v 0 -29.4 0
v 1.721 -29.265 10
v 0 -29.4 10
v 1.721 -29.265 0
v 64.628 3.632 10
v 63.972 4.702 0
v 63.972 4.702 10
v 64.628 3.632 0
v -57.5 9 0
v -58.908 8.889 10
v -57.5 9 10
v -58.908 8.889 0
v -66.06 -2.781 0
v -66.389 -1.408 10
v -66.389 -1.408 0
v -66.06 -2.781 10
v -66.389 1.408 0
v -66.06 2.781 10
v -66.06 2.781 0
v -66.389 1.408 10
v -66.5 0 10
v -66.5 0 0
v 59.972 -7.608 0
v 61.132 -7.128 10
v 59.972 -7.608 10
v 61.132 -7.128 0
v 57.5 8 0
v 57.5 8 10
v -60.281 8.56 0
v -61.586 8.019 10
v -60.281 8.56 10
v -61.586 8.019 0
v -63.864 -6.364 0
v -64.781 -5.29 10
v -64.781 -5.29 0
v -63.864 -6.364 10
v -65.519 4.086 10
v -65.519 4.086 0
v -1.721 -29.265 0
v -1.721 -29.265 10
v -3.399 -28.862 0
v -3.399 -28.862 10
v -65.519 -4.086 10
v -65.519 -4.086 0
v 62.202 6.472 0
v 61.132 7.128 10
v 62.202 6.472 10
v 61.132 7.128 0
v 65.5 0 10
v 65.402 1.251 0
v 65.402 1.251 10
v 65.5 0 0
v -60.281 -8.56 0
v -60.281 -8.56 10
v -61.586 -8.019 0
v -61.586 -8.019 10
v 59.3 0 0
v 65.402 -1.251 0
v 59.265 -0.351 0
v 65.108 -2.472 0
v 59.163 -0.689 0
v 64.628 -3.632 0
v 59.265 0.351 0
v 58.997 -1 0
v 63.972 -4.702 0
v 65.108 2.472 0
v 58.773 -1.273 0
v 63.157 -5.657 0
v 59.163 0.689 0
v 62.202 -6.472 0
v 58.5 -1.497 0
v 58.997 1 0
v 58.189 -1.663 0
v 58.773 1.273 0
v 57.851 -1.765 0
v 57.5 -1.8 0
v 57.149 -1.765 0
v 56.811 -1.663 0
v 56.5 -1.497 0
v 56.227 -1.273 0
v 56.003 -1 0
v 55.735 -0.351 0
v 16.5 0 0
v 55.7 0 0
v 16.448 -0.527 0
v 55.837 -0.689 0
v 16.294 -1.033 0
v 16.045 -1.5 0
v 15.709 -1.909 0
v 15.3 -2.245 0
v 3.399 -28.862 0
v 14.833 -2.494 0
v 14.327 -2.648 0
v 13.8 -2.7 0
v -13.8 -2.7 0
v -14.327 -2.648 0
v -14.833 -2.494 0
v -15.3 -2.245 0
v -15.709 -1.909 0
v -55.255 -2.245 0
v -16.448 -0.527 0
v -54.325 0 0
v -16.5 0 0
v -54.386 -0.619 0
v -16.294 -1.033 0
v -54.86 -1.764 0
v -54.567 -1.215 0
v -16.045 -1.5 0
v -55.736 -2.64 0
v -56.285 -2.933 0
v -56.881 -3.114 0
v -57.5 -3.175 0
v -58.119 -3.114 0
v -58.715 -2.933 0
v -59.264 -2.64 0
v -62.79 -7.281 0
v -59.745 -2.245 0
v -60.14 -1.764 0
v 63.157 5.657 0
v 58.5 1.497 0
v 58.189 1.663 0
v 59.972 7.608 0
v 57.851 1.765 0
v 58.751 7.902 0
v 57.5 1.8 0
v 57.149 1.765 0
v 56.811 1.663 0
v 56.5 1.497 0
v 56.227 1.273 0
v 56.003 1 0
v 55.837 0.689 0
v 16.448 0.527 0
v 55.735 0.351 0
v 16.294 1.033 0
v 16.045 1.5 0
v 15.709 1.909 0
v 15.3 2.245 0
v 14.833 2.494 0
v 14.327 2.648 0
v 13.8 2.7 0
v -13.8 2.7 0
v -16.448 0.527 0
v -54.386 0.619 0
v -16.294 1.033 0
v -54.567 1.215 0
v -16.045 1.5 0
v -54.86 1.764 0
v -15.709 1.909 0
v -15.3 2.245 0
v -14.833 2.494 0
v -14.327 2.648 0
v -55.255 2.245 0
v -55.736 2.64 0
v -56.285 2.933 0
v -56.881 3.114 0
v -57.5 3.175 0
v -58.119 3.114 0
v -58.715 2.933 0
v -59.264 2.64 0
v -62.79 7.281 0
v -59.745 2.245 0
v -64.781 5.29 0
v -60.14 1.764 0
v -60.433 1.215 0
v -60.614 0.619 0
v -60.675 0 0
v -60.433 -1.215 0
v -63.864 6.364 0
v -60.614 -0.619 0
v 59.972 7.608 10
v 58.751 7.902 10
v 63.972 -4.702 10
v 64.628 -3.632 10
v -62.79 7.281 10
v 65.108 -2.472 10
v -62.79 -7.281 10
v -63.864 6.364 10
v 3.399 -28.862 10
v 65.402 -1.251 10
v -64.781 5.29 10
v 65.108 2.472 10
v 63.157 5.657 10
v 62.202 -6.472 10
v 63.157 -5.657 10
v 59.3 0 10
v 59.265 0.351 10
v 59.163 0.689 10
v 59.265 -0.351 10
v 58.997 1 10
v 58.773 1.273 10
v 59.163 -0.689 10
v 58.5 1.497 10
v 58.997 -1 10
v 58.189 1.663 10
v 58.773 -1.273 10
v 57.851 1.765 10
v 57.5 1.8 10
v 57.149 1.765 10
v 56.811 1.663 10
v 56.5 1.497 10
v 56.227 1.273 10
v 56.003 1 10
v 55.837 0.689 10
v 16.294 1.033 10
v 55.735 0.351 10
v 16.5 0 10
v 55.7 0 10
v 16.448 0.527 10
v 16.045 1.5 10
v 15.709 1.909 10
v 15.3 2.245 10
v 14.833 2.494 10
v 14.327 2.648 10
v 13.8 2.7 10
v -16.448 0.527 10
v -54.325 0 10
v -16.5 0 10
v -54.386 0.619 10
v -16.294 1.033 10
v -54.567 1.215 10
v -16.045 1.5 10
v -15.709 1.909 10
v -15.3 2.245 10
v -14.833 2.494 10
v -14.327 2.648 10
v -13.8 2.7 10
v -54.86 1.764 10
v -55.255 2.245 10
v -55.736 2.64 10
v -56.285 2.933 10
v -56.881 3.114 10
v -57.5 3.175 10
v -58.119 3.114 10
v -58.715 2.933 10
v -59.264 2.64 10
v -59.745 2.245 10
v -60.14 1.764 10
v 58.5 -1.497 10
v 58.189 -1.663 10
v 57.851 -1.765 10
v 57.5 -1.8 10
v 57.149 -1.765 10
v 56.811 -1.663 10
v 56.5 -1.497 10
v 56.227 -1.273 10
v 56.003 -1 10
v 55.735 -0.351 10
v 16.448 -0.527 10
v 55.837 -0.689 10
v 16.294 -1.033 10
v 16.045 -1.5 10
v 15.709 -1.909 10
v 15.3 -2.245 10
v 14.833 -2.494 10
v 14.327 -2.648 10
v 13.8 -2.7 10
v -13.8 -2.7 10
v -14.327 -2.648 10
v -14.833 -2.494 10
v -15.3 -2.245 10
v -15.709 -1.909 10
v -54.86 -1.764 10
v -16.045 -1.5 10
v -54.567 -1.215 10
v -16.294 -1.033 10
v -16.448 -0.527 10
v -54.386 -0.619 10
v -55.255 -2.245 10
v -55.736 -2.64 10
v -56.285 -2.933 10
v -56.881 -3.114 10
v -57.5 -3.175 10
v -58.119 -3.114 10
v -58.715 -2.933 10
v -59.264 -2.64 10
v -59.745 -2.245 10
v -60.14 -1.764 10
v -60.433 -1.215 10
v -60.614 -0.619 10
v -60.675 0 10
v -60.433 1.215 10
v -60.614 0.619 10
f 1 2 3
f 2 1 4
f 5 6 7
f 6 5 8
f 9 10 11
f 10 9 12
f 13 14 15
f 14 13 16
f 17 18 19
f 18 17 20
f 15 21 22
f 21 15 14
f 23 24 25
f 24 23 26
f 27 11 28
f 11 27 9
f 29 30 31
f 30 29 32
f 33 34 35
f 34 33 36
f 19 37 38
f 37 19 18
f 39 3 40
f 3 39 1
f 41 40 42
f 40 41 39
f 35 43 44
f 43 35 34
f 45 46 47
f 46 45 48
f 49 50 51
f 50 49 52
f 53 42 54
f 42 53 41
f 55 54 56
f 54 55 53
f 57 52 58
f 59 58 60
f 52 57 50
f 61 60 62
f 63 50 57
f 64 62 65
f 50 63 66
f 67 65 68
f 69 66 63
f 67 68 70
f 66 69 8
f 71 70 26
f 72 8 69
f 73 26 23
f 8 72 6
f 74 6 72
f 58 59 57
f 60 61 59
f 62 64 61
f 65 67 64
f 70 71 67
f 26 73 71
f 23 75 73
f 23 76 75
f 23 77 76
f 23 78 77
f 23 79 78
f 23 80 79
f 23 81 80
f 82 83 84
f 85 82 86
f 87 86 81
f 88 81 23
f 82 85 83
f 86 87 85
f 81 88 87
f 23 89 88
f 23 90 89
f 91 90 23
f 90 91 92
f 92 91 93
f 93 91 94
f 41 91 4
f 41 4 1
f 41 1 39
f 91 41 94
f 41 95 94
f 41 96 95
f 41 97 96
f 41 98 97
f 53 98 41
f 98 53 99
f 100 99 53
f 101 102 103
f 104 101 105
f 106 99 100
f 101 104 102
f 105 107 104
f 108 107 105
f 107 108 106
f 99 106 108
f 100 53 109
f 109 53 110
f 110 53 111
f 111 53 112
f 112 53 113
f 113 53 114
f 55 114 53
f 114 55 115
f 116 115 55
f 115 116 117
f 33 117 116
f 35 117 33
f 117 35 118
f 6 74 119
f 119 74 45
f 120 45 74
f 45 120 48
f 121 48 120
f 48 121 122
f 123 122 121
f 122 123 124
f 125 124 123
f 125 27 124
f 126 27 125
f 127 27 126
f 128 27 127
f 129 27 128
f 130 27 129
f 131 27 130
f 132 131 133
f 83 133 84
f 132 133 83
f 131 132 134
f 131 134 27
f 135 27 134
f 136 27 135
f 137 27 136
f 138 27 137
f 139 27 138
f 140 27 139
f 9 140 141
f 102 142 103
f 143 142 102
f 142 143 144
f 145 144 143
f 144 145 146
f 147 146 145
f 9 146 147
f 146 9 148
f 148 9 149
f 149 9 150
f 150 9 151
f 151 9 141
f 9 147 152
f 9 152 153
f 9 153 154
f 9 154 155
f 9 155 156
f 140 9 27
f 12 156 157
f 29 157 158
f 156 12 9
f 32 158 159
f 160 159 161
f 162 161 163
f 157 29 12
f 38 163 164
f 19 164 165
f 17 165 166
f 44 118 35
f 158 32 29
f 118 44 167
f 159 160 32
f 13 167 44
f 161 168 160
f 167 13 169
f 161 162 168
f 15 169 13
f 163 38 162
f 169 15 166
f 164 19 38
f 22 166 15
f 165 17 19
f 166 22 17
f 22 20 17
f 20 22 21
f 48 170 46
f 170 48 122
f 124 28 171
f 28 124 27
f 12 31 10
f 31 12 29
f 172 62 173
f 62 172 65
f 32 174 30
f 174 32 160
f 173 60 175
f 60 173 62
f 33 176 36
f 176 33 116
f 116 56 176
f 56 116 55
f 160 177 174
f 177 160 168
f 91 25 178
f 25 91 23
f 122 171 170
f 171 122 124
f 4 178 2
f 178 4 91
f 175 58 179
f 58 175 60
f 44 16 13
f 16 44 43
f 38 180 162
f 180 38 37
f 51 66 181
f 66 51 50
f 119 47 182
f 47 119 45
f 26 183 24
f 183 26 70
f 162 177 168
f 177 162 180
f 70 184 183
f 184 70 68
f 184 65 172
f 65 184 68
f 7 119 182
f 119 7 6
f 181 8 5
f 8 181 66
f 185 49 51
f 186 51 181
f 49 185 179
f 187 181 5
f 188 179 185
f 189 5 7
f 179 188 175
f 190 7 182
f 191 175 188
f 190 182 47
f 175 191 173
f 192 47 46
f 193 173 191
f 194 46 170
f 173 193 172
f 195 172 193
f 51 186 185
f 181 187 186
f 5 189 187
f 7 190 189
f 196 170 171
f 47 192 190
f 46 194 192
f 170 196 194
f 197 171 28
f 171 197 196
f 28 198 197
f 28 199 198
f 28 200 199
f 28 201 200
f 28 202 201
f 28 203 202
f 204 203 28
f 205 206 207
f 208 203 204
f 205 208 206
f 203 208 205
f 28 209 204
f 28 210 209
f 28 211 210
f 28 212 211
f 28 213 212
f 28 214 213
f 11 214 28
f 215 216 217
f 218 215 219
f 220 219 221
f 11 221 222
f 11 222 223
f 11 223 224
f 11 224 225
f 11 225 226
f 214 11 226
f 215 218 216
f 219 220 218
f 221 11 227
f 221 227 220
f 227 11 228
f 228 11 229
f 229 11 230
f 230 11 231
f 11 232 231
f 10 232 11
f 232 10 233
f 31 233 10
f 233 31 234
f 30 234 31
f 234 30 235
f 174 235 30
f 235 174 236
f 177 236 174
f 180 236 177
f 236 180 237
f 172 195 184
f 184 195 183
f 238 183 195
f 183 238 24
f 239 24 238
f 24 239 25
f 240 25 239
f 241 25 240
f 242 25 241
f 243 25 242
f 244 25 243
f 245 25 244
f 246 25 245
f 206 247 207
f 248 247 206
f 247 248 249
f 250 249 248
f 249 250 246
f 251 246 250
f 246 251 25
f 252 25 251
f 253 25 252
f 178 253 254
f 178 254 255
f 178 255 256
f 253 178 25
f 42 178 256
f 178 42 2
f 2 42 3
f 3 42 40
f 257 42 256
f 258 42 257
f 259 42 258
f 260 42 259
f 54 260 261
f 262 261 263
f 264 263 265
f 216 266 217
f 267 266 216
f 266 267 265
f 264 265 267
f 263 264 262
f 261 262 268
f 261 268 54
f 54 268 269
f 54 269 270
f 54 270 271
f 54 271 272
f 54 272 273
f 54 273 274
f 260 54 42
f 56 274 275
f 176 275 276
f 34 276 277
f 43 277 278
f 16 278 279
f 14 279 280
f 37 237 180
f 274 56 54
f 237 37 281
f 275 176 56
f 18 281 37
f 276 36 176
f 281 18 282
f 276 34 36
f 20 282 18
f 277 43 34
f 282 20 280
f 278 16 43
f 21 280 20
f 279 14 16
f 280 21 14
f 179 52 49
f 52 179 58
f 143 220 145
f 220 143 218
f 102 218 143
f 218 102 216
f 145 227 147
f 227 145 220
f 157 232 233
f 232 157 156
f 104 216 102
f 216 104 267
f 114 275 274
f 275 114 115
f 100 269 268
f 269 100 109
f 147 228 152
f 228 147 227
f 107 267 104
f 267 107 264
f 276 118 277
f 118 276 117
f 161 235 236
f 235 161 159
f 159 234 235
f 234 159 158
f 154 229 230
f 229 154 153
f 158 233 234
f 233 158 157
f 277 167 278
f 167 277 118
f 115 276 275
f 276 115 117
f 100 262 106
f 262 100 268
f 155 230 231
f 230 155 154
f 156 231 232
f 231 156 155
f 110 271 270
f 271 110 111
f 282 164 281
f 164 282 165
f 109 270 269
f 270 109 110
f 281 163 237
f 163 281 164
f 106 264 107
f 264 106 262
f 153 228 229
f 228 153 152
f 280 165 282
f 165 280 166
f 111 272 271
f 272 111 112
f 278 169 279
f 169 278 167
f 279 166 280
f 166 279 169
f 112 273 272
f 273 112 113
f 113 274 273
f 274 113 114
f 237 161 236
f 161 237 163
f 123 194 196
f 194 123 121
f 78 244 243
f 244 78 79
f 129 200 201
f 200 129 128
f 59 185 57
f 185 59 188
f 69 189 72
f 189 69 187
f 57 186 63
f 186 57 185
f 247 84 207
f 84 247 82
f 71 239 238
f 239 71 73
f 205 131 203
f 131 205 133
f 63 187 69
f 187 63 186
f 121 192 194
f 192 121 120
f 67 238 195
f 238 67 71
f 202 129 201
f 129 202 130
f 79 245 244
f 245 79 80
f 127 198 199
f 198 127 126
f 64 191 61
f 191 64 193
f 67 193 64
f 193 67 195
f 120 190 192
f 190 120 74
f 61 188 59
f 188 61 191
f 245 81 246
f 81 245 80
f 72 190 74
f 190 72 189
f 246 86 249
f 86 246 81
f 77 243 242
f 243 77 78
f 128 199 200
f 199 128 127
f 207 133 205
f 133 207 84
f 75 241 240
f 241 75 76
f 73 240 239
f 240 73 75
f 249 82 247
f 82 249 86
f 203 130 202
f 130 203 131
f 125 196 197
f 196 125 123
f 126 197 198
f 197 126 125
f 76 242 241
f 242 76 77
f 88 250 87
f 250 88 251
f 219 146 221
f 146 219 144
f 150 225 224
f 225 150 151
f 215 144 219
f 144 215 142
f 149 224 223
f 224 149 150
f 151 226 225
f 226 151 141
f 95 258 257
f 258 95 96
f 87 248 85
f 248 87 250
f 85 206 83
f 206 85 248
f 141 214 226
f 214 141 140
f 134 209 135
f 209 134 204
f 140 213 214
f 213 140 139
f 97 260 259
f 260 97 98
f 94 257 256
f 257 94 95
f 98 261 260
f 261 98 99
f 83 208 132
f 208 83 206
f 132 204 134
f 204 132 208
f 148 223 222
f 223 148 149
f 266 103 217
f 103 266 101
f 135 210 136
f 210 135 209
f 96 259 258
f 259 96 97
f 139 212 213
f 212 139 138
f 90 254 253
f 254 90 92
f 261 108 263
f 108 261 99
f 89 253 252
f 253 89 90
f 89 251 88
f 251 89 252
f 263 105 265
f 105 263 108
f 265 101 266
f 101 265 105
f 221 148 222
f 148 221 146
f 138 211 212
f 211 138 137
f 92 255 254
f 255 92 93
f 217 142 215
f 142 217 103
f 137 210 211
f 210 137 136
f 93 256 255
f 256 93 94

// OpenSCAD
$fn = 32;

// ----------------------------------------------------------------------
// Lever: 115 mm between the bosses, 10 mm thick, smooth outline
// ----------------------------------------------------------------------

// --- parameters (mm) ---
lever_l = 115;            // distance between the boss centres
boss_a = 18;              // first boss diameter
boss_b = 16;              // second boss diameter
bore_a = 6.35;            // first bore
bore_b = 3.6;             // second bore
lever_t = 10;             // lever thickness
boss_c = 22;              // middle boss diameter
bend = 18.4;              // how far the middle boss drops
slot_w = 5.4;             // adjustment slot width

lever_profile = [[-66.5, 0], [-66.389, -1.408], [-66.06, -2.781], [-65.519, -4.086], [-64.781, -5.29], [-63.864, -6.364], [-62.79, -7.281], [-61.586, -8.019], [-60.281, -8.56], [-3.399, -28.862], [-1.721, -29.265], [0, -29.4], [1.721, -29.265], [3.399, -28.862], [59.972, -7.608], [61.132, -7.128], [62.202, -6.472], [63.157, -5.657], [63.972, -4.702], [64.628, -3.632], [65.108, -2.472], [65.402, -1.251], [65.5, 0], [65.402, 1.251], [65.108, 2.472], [64.628, 3.632], [63.972, 4.702], [63.157, 5.657], [62.202, 6.472], [61.132, 7.128], [59.972, 7.608], [58.751, 7.902], [57.5, 8], [-57.5, 9], [-58.908, 8.889], [-60.281, 8.56], [-61.586, 8.019], [-62.79, 7.281], [-63.864, 6.364], [-64.781, 5.29], [-65.519, 4.086], [-66.06, 2.781], [-66.389, 1.408]];

difference() {
  linear_extrude(height = lever_t) polygon(lever_profile);
  translate([-57.5, 0, -2.5]) cylinder(h = lever_t + 5, d = bore_a);
  translate([57.5, 0, -2.5]) cylinder(h = lever_t + 5, d = bore_b);
  /* slotted adjustment, stadium shaped */
  hull() {
    translate([-13.8, 0, -2.5]) cylinder(h = lever_t + 5, d = slot_w);
    translate([13.8, 0, -2.5]) cylinder(h = lever_t + 5, d = slot_w);
  }
}
